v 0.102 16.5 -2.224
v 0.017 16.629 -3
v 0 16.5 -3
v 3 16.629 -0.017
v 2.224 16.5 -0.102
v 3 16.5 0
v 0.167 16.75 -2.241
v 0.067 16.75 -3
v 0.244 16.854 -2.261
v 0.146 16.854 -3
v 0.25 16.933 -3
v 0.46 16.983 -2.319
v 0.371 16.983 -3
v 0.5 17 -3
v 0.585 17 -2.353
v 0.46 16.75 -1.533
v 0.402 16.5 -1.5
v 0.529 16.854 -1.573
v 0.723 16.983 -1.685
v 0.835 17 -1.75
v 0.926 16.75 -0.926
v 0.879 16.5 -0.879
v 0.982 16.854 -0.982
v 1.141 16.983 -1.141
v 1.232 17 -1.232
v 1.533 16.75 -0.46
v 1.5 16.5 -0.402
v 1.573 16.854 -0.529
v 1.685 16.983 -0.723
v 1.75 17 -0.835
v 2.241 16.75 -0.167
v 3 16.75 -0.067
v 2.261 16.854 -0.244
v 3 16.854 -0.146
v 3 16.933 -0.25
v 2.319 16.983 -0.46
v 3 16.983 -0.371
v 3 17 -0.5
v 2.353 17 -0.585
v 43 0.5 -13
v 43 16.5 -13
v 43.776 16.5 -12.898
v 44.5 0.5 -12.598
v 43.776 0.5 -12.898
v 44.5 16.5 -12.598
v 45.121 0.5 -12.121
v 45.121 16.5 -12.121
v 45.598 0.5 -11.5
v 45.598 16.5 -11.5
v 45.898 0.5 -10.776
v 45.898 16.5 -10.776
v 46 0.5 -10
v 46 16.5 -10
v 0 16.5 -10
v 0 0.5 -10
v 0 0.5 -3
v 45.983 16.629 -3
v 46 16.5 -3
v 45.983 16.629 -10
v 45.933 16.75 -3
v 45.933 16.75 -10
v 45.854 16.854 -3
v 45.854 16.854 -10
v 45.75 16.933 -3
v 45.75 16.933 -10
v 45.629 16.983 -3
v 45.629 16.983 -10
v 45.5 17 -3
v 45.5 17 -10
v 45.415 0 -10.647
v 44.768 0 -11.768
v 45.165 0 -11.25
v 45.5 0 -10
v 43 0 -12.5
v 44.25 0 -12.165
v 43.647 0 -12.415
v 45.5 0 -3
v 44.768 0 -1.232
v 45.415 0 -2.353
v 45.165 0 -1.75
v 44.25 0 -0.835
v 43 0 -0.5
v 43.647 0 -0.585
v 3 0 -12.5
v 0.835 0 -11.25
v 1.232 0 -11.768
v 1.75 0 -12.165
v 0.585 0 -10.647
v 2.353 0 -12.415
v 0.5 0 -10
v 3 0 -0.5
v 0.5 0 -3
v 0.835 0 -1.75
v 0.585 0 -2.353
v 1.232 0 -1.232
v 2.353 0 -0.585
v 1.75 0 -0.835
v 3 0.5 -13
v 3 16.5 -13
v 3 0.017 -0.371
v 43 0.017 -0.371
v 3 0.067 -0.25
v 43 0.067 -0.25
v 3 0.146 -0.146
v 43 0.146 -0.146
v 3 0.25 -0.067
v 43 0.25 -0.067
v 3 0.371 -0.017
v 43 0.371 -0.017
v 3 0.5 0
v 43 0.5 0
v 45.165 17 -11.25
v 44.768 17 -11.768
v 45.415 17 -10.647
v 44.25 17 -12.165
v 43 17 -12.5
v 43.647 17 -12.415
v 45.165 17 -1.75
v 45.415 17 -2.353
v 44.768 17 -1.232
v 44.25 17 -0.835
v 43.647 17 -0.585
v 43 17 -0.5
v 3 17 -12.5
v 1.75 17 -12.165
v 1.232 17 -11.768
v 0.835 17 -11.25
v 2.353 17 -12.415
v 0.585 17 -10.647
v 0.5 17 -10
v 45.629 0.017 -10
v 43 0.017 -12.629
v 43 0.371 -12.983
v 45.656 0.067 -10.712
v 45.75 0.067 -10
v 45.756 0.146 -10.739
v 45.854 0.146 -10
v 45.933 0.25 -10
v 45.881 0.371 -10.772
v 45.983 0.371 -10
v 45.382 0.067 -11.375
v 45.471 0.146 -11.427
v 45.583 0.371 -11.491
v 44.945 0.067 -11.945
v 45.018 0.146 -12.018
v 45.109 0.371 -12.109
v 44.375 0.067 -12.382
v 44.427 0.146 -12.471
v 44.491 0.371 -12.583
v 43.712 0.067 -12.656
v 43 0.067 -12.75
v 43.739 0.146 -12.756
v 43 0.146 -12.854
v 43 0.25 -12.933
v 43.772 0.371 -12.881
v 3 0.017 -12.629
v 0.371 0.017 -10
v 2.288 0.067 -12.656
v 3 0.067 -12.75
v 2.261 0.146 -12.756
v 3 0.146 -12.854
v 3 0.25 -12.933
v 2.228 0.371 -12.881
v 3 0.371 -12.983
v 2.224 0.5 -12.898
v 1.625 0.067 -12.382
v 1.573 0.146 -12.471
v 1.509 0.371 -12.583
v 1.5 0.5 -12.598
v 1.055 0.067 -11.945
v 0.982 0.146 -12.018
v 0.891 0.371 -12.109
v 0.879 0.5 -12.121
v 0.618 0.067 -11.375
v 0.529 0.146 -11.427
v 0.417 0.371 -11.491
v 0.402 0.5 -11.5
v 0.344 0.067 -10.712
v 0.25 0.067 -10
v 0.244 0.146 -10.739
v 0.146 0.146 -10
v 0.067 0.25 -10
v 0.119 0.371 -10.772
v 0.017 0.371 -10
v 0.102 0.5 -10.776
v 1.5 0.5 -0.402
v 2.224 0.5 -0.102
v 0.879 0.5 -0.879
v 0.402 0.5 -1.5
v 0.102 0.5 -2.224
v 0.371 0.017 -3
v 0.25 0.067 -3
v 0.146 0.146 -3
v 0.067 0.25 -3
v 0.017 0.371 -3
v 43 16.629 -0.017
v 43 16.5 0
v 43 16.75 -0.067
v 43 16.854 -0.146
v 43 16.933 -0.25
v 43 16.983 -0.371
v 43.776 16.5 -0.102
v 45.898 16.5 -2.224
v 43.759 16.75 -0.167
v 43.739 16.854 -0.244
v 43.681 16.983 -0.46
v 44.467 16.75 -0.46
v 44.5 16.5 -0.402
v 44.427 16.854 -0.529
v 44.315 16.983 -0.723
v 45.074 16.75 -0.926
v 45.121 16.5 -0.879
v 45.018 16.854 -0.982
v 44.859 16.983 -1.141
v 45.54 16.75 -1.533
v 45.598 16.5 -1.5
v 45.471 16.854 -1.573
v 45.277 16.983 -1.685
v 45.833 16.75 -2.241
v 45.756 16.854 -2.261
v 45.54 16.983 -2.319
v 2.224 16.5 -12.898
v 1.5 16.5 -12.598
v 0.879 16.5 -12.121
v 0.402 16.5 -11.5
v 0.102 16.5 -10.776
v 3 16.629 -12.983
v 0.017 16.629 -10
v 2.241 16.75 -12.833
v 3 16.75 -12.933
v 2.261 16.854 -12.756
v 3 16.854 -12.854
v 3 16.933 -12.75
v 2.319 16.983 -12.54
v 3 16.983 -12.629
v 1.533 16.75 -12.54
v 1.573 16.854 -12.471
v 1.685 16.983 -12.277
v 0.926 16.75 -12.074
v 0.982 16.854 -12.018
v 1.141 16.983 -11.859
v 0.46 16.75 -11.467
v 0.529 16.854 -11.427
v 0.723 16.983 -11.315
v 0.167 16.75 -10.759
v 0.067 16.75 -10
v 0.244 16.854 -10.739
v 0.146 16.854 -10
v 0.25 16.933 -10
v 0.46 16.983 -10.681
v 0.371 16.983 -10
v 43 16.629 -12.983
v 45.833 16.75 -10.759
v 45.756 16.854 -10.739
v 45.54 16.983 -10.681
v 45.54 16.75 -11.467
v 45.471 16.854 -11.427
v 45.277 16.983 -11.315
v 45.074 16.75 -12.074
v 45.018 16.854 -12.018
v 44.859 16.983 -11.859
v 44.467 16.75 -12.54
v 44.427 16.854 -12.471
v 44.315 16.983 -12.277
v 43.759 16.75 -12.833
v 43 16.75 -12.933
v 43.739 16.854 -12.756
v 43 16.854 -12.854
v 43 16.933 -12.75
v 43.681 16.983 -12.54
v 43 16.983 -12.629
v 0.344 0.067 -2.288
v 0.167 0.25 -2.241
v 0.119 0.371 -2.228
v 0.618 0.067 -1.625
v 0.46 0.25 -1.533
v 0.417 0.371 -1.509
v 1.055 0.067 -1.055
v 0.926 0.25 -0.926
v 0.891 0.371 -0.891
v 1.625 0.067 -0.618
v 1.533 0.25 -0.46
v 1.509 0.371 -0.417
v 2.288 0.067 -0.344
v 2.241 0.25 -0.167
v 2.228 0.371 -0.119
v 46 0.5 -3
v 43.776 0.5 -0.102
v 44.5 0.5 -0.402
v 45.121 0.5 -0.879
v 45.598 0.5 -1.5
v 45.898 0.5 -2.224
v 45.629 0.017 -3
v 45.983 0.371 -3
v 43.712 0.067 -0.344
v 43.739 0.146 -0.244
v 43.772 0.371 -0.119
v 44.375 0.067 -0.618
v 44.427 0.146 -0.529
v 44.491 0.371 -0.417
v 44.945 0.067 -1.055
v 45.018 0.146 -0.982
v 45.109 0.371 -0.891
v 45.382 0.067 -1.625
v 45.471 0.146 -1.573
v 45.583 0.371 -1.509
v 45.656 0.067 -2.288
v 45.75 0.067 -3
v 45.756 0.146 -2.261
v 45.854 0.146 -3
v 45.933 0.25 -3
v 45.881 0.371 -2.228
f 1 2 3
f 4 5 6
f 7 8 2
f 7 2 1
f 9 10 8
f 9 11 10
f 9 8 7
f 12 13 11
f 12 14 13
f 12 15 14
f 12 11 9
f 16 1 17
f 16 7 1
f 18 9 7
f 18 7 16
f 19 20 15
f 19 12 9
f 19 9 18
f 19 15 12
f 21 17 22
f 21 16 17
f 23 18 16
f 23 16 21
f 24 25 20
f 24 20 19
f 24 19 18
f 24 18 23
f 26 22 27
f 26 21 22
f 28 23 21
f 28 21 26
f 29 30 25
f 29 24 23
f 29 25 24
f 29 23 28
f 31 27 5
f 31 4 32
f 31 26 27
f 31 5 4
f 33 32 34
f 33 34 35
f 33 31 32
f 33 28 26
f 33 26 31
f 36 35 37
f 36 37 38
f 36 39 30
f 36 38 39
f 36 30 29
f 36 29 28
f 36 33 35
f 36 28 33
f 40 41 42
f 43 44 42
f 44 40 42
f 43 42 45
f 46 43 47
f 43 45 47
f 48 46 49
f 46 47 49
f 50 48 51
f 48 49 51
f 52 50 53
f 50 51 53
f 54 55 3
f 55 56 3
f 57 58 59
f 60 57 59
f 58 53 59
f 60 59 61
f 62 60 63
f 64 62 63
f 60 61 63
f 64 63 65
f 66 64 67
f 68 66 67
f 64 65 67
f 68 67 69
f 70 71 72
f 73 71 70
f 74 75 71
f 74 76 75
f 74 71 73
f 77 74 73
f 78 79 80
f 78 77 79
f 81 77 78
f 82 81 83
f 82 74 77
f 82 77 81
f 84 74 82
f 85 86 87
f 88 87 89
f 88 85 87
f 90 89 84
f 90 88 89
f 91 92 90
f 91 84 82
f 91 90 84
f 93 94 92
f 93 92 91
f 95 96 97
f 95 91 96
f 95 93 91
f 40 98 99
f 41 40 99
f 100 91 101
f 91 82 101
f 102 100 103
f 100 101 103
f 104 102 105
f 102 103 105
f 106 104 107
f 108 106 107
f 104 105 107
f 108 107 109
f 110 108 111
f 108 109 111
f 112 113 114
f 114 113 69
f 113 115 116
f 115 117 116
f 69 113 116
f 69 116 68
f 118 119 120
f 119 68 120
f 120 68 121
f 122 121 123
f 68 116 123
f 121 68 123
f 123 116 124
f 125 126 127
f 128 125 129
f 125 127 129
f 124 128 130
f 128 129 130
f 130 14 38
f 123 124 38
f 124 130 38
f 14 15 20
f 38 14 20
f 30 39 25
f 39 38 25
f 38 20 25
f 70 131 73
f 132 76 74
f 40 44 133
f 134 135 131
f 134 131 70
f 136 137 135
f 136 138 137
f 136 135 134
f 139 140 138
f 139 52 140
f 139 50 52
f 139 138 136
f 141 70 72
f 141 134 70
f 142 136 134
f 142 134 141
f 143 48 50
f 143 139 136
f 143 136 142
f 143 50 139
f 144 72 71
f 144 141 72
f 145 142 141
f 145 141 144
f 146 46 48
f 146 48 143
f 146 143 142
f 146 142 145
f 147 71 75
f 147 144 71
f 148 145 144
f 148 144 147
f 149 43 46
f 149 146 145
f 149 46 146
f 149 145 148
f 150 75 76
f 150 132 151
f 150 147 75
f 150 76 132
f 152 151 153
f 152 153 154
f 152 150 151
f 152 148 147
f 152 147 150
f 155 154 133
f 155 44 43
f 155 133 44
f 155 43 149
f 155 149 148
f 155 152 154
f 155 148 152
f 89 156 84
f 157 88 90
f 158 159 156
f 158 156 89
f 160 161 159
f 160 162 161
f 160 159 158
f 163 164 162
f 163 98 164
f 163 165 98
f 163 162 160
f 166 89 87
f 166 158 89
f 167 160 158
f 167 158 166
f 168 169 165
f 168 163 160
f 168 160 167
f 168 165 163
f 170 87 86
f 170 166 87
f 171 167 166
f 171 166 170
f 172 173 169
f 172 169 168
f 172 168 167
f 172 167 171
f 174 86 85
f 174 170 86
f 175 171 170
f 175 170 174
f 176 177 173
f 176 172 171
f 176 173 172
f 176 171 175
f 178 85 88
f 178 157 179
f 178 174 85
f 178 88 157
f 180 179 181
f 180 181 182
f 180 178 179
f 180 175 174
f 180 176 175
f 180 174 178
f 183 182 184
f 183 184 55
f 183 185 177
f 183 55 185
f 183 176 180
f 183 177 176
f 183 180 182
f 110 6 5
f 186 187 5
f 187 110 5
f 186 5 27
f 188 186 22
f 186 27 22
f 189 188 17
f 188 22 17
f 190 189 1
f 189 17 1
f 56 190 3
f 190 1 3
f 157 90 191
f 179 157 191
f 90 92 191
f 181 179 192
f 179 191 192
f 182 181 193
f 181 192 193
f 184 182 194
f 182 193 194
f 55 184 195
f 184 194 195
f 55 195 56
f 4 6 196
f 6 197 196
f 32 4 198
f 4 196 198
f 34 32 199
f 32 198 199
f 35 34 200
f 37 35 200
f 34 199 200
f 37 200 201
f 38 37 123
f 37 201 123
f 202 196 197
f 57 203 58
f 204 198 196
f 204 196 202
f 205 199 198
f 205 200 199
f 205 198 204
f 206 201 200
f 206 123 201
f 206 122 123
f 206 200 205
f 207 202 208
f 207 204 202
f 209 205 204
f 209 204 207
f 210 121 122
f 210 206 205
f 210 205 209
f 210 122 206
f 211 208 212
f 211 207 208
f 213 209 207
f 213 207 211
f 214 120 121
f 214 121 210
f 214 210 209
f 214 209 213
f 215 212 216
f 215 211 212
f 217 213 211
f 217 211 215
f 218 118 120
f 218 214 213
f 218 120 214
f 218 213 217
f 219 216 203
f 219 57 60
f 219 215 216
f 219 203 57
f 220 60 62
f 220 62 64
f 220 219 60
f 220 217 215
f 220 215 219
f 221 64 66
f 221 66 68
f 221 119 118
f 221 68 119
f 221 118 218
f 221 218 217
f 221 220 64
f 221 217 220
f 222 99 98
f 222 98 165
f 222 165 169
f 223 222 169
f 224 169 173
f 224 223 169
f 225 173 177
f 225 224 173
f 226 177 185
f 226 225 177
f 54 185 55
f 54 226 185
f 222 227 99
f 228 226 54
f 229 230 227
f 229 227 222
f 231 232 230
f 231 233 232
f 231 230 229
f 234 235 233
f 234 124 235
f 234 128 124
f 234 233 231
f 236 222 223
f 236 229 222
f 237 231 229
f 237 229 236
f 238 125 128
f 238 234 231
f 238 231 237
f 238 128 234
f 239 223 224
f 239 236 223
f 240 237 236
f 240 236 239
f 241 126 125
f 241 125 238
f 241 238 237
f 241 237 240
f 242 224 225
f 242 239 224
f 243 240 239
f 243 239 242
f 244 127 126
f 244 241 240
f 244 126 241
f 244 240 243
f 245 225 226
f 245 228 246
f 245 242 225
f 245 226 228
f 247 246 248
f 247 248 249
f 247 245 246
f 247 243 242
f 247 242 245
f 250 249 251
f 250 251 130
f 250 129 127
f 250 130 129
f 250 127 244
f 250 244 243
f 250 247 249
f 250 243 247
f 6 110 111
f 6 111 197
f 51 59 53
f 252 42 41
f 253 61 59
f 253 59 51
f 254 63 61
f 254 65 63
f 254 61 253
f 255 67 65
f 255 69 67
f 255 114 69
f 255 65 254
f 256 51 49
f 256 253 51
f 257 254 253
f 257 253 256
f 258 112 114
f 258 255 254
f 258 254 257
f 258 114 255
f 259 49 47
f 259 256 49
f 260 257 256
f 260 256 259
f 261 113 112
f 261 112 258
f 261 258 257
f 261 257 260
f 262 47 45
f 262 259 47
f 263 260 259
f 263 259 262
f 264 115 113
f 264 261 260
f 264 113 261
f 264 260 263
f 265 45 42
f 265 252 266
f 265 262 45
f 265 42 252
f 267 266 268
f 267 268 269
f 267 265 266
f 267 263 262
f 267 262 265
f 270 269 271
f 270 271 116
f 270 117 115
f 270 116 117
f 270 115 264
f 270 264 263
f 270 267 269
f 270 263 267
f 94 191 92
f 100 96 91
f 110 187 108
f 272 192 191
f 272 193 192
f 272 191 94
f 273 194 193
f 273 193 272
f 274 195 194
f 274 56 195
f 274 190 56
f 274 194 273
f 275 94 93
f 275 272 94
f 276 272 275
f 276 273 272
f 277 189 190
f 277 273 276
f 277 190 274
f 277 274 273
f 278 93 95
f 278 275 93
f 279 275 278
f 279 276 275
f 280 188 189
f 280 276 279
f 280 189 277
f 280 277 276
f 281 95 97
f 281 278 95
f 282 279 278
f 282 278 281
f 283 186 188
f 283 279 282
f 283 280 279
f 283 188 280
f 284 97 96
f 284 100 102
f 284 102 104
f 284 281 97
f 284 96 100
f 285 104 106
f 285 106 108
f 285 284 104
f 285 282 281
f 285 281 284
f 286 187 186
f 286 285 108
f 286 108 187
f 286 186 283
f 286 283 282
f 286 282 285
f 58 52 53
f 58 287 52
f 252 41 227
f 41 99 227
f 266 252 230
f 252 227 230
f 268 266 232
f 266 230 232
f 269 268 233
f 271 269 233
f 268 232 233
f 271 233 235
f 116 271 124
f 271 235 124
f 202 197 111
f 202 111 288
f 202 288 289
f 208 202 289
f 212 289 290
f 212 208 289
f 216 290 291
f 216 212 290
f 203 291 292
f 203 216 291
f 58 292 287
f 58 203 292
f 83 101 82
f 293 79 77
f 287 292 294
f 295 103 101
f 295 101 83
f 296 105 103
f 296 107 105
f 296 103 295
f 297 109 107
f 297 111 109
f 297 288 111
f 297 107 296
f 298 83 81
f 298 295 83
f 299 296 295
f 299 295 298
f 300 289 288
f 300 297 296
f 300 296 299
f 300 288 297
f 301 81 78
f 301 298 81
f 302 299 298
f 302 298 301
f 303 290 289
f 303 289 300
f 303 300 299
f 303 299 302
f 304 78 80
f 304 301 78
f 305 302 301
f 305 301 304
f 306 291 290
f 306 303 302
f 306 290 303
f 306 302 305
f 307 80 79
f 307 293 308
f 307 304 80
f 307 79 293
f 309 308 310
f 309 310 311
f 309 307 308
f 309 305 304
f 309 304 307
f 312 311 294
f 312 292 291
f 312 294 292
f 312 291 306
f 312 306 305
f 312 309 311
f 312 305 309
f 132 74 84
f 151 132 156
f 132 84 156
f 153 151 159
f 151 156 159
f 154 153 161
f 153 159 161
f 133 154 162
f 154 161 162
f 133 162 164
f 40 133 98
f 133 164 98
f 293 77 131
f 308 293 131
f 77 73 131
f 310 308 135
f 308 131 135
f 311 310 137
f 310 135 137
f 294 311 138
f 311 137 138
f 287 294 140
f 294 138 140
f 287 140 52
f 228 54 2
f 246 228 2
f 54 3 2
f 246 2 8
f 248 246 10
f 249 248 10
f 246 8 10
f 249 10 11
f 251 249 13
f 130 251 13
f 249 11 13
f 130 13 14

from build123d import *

# Parameters (mm, degrees)
F0_W     = 17
F0_H     = 13
F1_DEPTH = 46
F2_R     = 3
F3_R     = 0.5


with BuildPart() as f1:
    # F0 (on Right) → F1 (new body)
    with BuildSketch(Plane.YZ):
        with Locations((8.5, -6.5)):
            Rectangle(F0_W, F0_H)
    extrude(amount=F1_DEPTH)

    # F2
    f2_edges = [f1.edges().sort_by_distance(p)[0] for p in [
        (46, 8.5, 0),
        (46, 8.5, -13),
        (0, 8.5, 0),
        (0, 8.5, -13),
    ]]
    fillet(f2_edges, radius=F2_R)

    # F3
    f3_edges = [f1.edges().sort_by_distance(p)[0] for p in [
        (23, 0, 0),
        (23, 17, 0),
    ]]
    fillet(f3_edges, radius=F3_R)


solid = f1.part
